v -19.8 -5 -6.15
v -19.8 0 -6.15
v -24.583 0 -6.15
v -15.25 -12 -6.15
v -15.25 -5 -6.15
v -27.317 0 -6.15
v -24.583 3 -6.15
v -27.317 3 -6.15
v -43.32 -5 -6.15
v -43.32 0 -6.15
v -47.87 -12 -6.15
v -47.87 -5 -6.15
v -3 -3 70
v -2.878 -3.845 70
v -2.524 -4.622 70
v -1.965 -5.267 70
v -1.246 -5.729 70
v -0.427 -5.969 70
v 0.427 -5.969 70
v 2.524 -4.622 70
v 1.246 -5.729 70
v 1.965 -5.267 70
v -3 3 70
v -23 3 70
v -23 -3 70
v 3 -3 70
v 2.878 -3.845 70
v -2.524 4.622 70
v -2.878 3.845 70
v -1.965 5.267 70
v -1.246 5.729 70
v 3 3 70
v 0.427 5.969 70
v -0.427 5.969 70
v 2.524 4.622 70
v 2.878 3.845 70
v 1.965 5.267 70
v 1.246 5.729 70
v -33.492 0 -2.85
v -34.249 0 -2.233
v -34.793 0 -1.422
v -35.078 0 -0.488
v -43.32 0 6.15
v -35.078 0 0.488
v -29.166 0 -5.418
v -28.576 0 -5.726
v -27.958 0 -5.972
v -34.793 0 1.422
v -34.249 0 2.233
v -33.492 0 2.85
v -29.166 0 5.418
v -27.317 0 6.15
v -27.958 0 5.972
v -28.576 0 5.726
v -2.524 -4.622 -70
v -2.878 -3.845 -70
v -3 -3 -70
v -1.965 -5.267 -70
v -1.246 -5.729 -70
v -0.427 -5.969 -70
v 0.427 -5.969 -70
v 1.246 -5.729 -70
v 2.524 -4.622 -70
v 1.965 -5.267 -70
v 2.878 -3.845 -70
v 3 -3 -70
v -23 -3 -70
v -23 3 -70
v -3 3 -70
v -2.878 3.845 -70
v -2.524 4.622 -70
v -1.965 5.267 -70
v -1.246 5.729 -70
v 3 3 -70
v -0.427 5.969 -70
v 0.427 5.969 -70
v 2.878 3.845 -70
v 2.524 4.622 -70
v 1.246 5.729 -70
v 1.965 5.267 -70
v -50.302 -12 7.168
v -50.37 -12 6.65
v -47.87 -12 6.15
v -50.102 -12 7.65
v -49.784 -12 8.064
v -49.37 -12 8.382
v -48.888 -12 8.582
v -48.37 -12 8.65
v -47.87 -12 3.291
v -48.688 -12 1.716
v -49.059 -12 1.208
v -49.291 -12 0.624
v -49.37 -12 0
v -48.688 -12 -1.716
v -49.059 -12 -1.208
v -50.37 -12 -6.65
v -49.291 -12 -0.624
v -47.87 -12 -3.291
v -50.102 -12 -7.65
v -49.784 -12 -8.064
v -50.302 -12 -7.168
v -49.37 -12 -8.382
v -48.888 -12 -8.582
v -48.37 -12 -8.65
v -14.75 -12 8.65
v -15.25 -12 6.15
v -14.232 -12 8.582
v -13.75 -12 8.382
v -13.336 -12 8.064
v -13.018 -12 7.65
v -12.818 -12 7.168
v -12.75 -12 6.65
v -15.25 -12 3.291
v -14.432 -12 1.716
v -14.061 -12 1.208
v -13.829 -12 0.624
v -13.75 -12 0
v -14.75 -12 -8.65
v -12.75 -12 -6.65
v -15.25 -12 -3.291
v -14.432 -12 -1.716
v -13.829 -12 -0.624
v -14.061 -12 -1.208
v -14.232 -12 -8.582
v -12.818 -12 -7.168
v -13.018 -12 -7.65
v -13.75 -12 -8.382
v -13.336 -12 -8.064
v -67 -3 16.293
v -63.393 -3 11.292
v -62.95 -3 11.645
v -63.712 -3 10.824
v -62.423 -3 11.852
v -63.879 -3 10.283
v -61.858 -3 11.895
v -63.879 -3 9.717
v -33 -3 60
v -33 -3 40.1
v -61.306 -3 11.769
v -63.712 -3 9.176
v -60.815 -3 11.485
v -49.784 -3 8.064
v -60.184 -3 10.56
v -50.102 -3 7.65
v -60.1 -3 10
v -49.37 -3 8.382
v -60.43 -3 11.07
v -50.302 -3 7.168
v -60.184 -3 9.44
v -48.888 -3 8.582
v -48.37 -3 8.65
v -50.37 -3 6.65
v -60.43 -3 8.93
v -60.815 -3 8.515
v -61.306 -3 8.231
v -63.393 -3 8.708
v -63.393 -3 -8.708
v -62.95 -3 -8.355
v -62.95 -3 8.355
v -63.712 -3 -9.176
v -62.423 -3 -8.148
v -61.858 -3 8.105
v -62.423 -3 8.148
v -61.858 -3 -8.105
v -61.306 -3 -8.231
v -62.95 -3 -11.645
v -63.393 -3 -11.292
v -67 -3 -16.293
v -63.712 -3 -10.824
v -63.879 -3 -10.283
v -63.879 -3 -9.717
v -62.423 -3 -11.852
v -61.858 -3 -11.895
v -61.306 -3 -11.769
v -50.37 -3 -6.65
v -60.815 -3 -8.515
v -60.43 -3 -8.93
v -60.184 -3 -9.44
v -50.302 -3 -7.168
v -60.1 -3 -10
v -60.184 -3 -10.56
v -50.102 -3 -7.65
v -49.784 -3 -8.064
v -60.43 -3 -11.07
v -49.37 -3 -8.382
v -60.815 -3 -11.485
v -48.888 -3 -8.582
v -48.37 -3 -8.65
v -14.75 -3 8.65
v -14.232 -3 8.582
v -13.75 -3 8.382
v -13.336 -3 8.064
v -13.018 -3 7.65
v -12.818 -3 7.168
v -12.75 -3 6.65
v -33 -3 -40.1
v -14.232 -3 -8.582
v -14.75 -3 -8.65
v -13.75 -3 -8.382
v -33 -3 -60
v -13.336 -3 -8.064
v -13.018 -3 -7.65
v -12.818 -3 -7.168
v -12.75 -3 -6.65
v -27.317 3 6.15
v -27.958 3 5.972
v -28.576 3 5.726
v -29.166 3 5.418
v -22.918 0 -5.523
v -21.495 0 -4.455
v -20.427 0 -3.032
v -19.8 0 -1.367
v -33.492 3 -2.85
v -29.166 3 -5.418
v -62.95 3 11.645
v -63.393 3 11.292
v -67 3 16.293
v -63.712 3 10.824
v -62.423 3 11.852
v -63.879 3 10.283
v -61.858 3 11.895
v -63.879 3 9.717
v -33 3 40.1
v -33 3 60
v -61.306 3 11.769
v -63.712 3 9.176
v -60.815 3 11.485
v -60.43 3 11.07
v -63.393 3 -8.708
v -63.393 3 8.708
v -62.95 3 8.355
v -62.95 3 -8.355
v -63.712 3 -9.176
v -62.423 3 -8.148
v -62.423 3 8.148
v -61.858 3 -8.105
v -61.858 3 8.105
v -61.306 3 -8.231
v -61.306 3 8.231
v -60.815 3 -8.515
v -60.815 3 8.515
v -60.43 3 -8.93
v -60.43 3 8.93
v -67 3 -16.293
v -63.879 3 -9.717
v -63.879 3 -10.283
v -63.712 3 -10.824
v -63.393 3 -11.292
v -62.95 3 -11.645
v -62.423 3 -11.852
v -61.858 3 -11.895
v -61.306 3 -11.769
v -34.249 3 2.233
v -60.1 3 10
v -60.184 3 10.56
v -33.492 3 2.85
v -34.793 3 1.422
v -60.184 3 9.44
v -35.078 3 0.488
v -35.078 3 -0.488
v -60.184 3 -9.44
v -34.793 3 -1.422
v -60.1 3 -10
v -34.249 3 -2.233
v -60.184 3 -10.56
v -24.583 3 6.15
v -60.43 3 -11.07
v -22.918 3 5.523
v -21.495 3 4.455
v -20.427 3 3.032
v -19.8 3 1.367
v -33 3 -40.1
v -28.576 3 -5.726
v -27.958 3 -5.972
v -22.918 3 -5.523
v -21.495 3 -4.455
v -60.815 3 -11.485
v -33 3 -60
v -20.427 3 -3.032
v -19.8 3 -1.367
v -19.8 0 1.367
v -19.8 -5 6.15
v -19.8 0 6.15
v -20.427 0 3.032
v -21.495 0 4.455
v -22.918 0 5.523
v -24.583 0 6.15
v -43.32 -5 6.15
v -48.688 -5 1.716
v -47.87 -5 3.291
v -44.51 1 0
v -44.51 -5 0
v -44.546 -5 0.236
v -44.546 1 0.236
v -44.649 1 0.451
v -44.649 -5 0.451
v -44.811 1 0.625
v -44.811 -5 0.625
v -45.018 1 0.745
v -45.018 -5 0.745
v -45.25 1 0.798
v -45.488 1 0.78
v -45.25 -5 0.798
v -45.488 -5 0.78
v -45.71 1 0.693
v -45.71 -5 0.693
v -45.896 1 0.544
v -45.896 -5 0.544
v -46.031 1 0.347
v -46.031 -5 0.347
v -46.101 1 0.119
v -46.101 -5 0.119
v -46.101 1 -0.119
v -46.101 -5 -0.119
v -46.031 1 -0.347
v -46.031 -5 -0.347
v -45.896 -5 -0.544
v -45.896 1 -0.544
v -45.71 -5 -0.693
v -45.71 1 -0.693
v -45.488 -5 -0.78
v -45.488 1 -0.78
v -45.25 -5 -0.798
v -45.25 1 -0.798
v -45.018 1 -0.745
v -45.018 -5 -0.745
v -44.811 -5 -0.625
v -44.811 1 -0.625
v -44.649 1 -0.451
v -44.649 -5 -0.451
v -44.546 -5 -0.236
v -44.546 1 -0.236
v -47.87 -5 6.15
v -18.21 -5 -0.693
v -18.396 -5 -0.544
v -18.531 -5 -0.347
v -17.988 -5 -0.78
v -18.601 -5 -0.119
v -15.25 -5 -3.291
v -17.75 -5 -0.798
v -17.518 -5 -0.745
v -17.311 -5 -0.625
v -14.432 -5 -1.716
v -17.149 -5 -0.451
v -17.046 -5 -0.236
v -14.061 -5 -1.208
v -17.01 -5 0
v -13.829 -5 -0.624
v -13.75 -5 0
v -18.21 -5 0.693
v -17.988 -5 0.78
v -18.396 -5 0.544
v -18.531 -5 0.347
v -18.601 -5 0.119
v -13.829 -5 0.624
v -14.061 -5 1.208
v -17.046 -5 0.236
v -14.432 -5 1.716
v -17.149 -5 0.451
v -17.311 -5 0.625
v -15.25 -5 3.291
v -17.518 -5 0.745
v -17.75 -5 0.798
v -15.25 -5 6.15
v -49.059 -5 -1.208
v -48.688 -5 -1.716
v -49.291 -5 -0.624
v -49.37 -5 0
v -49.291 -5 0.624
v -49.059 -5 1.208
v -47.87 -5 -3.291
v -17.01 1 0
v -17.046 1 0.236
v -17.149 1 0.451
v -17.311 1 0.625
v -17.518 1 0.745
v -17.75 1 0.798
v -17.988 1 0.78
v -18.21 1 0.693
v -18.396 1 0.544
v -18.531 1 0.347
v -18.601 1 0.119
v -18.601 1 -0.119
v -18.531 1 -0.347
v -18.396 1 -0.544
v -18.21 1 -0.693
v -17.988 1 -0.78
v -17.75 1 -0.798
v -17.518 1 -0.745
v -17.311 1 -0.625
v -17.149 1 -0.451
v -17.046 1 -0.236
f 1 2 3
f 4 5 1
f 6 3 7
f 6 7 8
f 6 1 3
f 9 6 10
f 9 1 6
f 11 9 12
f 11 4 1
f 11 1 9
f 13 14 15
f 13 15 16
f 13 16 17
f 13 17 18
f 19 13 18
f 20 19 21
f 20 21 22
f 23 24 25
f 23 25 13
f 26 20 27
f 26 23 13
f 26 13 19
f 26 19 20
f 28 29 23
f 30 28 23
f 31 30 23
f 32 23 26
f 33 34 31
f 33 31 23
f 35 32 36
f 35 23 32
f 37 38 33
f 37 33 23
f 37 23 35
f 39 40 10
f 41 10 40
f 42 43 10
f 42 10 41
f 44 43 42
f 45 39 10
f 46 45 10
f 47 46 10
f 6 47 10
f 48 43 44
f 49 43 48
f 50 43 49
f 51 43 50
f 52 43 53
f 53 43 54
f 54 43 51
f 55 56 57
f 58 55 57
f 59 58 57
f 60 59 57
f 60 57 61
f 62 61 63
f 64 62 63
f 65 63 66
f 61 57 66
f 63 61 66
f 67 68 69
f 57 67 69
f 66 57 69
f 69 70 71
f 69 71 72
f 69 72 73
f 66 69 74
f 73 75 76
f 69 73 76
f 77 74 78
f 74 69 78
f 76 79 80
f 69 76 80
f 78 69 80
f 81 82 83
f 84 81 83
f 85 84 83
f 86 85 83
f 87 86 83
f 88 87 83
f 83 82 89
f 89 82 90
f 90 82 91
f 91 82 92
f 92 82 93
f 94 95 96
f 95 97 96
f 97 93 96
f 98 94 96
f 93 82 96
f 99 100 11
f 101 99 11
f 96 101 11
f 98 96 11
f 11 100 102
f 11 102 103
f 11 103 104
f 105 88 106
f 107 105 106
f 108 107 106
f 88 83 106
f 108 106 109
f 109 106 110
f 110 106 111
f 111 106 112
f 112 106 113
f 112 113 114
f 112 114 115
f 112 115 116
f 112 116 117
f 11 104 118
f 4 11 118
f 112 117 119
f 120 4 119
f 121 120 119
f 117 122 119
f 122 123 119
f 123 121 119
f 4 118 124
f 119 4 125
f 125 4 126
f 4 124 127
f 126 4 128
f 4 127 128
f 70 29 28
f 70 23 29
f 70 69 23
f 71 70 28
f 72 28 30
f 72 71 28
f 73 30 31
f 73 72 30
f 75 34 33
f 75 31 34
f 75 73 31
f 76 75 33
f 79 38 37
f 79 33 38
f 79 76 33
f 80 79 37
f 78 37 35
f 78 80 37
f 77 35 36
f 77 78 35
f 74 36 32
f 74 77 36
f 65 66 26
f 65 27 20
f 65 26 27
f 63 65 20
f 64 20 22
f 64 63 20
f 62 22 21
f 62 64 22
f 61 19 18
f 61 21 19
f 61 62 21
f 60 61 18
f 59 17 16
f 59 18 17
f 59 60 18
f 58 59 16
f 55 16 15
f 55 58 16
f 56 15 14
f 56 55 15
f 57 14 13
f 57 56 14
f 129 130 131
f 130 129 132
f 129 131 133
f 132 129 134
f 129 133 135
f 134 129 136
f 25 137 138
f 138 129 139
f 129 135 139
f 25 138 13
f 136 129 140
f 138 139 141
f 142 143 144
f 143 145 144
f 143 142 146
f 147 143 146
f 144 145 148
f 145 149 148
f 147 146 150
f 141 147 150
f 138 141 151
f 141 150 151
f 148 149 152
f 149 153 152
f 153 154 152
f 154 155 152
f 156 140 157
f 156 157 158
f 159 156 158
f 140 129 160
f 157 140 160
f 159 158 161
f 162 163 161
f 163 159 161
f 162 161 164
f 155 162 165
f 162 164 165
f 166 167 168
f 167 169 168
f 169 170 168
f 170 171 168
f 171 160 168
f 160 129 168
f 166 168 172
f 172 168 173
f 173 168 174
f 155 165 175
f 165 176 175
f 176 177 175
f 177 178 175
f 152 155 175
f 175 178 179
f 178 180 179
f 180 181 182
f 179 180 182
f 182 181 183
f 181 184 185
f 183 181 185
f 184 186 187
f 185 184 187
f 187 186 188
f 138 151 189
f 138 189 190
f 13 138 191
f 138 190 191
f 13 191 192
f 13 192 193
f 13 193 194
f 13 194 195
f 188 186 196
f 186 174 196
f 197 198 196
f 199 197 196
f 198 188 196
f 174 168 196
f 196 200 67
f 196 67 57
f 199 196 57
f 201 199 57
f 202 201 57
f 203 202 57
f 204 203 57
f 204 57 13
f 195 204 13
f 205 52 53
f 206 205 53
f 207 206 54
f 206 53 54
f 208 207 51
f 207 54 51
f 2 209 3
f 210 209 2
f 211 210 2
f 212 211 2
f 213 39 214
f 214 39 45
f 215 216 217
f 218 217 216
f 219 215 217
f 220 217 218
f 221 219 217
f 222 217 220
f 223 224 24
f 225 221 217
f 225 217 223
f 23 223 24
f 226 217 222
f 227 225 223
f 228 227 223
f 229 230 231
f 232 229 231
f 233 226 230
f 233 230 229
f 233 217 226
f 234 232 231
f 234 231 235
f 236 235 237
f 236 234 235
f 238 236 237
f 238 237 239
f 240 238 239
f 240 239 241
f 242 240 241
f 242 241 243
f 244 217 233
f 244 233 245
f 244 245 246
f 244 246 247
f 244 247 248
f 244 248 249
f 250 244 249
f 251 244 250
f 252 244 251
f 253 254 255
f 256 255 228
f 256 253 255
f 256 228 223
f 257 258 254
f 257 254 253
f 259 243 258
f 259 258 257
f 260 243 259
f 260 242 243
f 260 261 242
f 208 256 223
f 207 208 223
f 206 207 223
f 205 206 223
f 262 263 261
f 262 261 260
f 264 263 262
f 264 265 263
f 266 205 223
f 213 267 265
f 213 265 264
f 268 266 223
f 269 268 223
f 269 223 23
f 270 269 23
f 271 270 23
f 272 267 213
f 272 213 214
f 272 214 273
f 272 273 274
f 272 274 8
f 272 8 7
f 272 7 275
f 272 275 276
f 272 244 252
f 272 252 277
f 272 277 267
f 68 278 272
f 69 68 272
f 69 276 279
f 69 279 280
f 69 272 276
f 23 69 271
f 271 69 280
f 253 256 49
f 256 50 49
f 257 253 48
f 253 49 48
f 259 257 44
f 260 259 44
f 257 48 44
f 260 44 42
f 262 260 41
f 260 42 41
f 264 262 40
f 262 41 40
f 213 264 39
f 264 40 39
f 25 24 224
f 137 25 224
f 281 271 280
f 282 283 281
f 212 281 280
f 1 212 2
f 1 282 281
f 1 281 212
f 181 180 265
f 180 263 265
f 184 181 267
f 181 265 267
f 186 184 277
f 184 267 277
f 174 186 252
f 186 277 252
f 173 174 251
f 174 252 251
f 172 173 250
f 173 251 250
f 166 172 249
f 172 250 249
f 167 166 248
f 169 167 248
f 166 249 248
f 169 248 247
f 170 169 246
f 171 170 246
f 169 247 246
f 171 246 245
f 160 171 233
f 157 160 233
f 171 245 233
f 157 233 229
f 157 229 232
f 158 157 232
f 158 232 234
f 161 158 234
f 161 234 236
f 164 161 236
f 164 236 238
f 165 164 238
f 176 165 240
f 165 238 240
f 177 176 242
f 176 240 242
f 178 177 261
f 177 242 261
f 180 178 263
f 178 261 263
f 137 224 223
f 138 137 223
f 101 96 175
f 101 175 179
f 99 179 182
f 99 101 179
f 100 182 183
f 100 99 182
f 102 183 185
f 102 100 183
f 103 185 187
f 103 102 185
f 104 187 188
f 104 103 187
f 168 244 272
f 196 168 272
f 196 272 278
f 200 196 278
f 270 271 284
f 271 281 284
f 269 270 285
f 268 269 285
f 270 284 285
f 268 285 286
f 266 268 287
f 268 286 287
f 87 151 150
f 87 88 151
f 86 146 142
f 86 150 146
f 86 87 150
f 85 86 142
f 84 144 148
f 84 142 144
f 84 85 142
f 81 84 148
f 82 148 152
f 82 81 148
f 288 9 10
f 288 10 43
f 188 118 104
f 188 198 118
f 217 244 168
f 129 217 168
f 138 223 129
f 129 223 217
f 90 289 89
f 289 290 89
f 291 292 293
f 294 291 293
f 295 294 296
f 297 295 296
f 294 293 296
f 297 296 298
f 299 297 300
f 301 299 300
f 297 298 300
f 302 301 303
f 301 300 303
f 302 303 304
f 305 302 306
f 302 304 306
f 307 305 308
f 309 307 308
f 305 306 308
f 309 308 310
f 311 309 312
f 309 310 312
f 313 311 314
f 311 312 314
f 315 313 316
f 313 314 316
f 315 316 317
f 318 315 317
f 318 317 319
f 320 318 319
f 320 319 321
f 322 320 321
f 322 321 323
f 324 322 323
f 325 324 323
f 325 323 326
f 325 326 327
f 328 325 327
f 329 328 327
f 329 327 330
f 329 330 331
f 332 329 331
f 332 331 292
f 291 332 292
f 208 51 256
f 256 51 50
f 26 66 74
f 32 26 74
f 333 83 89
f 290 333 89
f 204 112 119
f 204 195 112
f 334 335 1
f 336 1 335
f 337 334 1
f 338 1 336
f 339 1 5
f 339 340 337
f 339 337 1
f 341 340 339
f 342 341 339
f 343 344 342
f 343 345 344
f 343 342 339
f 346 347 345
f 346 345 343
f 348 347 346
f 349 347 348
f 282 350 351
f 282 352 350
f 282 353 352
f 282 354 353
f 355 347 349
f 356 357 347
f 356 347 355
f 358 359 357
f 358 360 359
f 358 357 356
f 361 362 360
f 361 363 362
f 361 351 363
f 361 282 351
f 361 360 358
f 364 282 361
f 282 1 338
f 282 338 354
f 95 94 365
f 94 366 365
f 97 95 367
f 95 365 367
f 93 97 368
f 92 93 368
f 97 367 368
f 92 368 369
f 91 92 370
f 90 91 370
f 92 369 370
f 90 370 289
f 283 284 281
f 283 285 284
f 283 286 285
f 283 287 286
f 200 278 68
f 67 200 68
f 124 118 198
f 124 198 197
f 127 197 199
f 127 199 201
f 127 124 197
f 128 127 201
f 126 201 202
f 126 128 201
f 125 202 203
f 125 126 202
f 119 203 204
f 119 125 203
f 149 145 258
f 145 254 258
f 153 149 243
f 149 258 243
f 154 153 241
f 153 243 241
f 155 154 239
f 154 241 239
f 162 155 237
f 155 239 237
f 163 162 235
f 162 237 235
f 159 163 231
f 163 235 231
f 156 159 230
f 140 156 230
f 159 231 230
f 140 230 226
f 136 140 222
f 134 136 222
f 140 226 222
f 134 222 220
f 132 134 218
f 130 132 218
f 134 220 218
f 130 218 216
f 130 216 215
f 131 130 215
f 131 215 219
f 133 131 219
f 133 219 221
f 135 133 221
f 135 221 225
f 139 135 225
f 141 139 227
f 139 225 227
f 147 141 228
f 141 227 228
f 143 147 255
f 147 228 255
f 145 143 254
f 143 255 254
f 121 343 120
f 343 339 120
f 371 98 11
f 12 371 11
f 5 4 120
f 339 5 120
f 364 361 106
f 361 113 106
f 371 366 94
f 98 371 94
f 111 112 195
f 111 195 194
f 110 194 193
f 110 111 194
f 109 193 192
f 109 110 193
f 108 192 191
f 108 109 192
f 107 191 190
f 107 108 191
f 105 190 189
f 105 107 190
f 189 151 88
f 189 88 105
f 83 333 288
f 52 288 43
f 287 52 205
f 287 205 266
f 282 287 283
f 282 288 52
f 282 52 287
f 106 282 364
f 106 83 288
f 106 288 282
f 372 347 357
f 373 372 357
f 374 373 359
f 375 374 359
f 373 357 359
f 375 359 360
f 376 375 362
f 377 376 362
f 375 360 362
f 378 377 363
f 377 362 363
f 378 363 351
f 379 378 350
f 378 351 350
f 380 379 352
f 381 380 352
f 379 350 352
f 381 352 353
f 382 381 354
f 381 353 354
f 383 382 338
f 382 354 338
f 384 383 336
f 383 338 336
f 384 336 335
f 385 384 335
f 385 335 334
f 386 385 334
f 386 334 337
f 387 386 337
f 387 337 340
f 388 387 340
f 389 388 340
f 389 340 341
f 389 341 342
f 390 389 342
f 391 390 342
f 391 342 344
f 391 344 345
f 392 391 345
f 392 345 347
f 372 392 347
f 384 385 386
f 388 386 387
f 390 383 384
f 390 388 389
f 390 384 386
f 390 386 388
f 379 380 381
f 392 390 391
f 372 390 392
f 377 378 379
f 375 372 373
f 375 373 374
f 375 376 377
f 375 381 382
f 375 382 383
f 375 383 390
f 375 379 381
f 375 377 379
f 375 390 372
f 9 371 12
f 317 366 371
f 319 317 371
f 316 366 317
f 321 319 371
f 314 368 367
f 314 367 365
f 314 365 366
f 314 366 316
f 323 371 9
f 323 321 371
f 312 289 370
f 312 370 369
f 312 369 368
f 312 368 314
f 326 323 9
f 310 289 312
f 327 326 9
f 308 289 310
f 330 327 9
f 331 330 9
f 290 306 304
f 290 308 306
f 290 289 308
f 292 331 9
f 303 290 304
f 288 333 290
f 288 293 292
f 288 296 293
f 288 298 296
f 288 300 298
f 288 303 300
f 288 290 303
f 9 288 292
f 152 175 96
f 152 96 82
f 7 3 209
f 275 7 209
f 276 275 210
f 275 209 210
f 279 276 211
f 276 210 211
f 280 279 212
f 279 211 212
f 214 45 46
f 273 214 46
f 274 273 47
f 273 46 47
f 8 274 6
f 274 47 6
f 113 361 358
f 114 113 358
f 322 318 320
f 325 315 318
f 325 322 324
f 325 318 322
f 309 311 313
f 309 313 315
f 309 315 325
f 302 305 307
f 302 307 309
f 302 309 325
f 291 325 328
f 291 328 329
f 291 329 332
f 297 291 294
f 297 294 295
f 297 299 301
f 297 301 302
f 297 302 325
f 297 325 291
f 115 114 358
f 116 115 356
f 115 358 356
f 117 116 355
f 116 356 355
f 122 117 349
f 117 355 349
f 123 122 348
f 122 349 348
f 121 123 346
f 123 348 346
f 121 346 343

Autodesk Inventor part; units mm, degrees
ref_plane "YZ Plane" through (0, 0, 0) normal (1, 0, 0) x (0, 1, 0)
ref_plane "XY Plane" through (0, 0, 0) normal (0, 0, 1) x (1, 0, 0)
sketch "Sketch1" plane through (0, 0, 0) normal (0, 0, 1) x (1, 0, 0)
  line L0 (-67, 3) -> (-67, -3)
  line L1 (-67, -3) -> (-3, -3)
  line L2 (-67, 3) -> (-3, 3)
  line L3 (0, -3) -> (0, 3) construction
  line L4 (3, -3) -> (3, 3)
  line L5 (-3, 3) -> (-3, -3)
  arc A0 (-3, -3) -> (3, -3) centre (0, -3) ccw
  arc A1 (3, 3) -> (-3, 3) centre (0, 3) ccw
  point P0 (0, 0)
  point P1 (-3, -3)
  dimension "d0" = 70
  dimension "d1" = 3
  dimension "d2" = 6
  dimension "d3" = 6
extrude "Extrusion1" add sketch "Sketch1" along normal mid plane 140
sketch "Sketch2" plane through (-67, 3, 70) normal (0, 1, 0) x (1, 0, 0)
  line L0 (0, 0) -> (64, 0) projected
  line L1 (64, 0) -> (44, 0)
  line L2 (0, 140) -> (0, 0) projected
  line L3 (44, 0) -> (34, 10)
  line L4 (34, 10) -> (34, 29.9)
  line L5 (34, 29.9) -> (0, 53.7071)
  line L6 (0, 53.7071) -> (0, 86.2929)
  line L7 (0, 86.2929) -> (34, 110.1)
  line L8 (34, 110.1) -> (34, 130)
  line L9 (34, 130) -> (44, 140)
  line L10 (0, 140) -> (64, 140) projected
  line L11 (44, 140) -> (64, 140)
  line L12 (64, 140) -> (64, 0) projected
  point P0 (67, 70)
  dimension "d6" = 20
  dimension "d7" = 20
  dimension "d8" = 30
  dimension "d9" = 45
  dimension "d10" = 45
  dimension "d11" = 19.9
  dimension "d12" = 19.9
  dimension "d13" = 125
  dimension "d14" = 125
extrude "Extrusion2" cut sketch "Sketch2" against normal through all contours L2 L5 L4 L3 L0 | L2 L10 L9 L8 L7
sketch "Sketch3" plane through (-3, 3, 70) normal (0, 1, 0) x (1, 0, 0)
  circle A0 centre (-59, 80) radius 1.9
  circle A1 centre (-59, 60) radius 1.9
  line L0 (-64, 86.2929) -> (-64, 53.7071) projected
  line L1 (-59, 80) -> (-59, 60)
  point P0 (3, 70)
  point P1 (-64, 70)
  dimension "d17" = 3.8
  dimension "d18" = 3.8
  dimension "d19" = 20
  dimension "d20" = 10
  dimension "d21" = 5
extrude "Extrusion3" cut sketch "Sketch3" against normal through all
sketch "Sketch4" plane through (-3, 3, 70) normal (0, 1, 0) x (1, 0, 0)
  line L0 (-44.67, 64.05) -> (-12.45, 64.05)
  line L1 (-12.45, 64.05) -> (-12.45, 75.95)
  line L2 (-12.45, 75.95) -> (-44.67, 75.95)
  line L3 (-44.67, 75.95) -> (-44.67, 64.05)
  line L4 (-44.67, 64.05) -> (-12.45, 75.95) construction
  line L5 (-12.45, 64.05) -> (-44.67, 75.95) construction
  line L6 (6, 140) -> (6, 0) projected
  line L7 (6, 70) -> (-4, 70)
  line L8 (-40.17, 64.05) -> (-16.95, 64.05)
  line L9 (-16.95, 64.05) -> (-16.95, 75.95)
  line L10 (-16.95, 75.95) -> (-40.17, 75.95)
  line L11 (-40.17, 75.95) -> (-40.17, 64.05)
  line L12 (0, 140) -> (0, 0) projected
  line L13 (-44.87, 76.15) -> (-12.25, 76.15)
  line L14 (-12.25, 76.15) -> (-12.25, 63.85)
  line L15 (-12.25, 63.85) -> (-44.87, 63.85)
  line L16 (-44.87, 63.85) -> (-44.87, 76.15)
  line L17 (-47.37, 78.65) -> (-47.37, 61.35)
  line L18 (-9.75, 61.35) -> (-9.75, 78.65)
  circle A0 centre (-59, 80) radius 1.9 projected
  circle A1 centre (-59, 60) radius 1.9 projected
  line L19 (-47.37, 61.35) -> (-60.337, 61.35)
  line L20 (-57.663, 61.35) -> (-9.75, 61.35)
  line L21 (-9.75, 78.65) -> (-57.663, 78.65)
  line L22 (-60.337, 78.65) -> (-47.37, 78.65)
  circle A2 centre (-29, 70) radius 2.45
  point P0 (3, 70)
  point P1 (-28.56, 70)
  point P2 (-47.37, 78.65)
  point P3 (-47.37, 61.35)
  point P4 (-57.663, 61.35)
  point P5 (-57.663, 78.65)
  dimension "d24" = 32.22
  dimension "d25" = 11.9
  dimension "d26" = 4.5
  dimension "d27" = 4.5
  dimension "d30" = 0.2
  dimension "d34" = 2.5
  dimension "d35" = 2.5
  dimension "d36" = 2.5
  dimension "d37" = 2.5
  dimension "d51" = 29
  dimension "d52" = 12.05
  dimension "d53" = 4.9
extrude "Extrusion4" add sketch "Sketch4" against normal blind 15 contours L3 L2 L11 L0 | L11 L2 L9 L0 | L9 L2 L1 L0 | L13 L14 L15 L16 | L21 L18 L20 L17 | A2
sketch "Sketch5" plane through (-3, -12, 70) normal (0, -1, 0) x (1, 0, 0)
  circle A0 centre (-59, -80) radius 1.9 projected
  circle A1 centre (-59, -60) radius 1.9 projected
  line L0 (-30, -110.1) -> (-64, -86.2929) projected
  line L1 (-64, -86.2929) -> (-64, -53.7071) projected
  line L2 (-64, -53.7071) -> (-30, -29.9) projected
  line L3 (-30, -29.9) -> (-30, -10) projected
  line L4 (-30, -10) -> (-20, 0) projected
  line L5 (0, 0) -> (-20, 0) projected
  line L6 (0, -140) -> (0, 0) projected
  line L7 (-20, -140) -> (0, -140) projected
  line L8 (-20, -140) -> (-30, -130) projected
  line L9 (-30, -130) -> (-30, -110.1) projected
  line L10 (-12.45, -75.95) -> (-44.67, -75.95) projected
  line L11 (-16.95, -64.05) -> (-16.95, -75.95) projected
  line L12 (-44.87, -76.15) -> (-12.25, -76.15) projected
  line L13 (-12.25, -76.15) -> (-12.25, -63.85) projected
  line L14 (-12.45, -64.05) -> (-12.45, -75.95) projected
  line L15 (-44.67, -64.05) -> (-12.45, -64.05) projected
  line L16 (-12.25, -63.85) -> (-44.87, -63.85) projected
  line L17 (-44.87, -63.85) -> (-44.87, -76.15) projected
  line L18 (-44.67, -75.95) -> (-44.67, -64.05) projected
  line L19 (-44.67, -64.05) -> (-12.45, -75.95) construction
  line L20 (-40.17, -75.95) -> (-40.17, -64.05) projected
  line L21 (-40.17, -75.95) -> (-40.17, -76.15)
  line L22 (-40.17, -64.05) -> (-40.17, -63.85)
  line L23 (-16.95, -76.15) -> (-16.95, -75.95)
  line L24 (-16.95, -64.05) -> (-16.95, -63.85)
  point P0 (3, -70)
extrude "Extrusion5" cut sketch "Sketch5" against normal blind 7 contours L14 L15 L24 L16 L13 L12 L23 L10 | L10 L11 L15 L14 | L23 L12 L21 L10 | L10 L20 L15 L11 | L21 L12 L17 L16 L22 L15 L18 L10 | L10 L18 L15 L20 | L15 L22 L16 L24
sketch "Sketch6" plane through (-3, -5, 70) normal (0, -1, 0) x (1, 0, 0)
  line L0 (-16.95, -64.05) -> (-16.95, -75.95) construction
  line L1 (-12.45, -64.05) -> (-44.67, -75.95) construction
  line L2 (-40.17, -75.95) -> (-40.17, -64.05) construction
  line L3 (-12.25, -63.85) -> (-12.25, -76.15) projected
  line L4 (-44.87, -63.85) -> (-12.25, -63.85) projected
  line L5 (-44.87, -76.15) -> (-44.87, -63.85) projected
  line L6 (-12.25, -76.15) -> (-44.87, -76.15) projected
  line L7 (-16.95, -64.05) -> (-16.95, -63.85)
  line L8 (-44.87, -63.85) -> (-12.25, -63.85) projected
  line L9 (-16.95, -75.95) -> (-16.95, -76.15)
  line L10 (-40.17, -76.15) -> (-40.17, -75.95)
  line L11 (-40.17, -64.05) -> (-40.17, -63.85)
  line L12 (-40.32, -76.15) -> (-40.32, -63.85)
  line L13 (-16.8, -76.15) -> (-16.8, -63.85)
  line L14 (-40.32, -76.15) -> (-16.8, -76.15)
  line L15 (-16.8, -76.15) -> (-16.8, -63.85)
  line L16 (-16.8, -63.85) -> (-40.32, -63.85)
  line L17 (-40.32, -63.85) -> (-40.32, -76.15)
  point P0 (3, -70)
  dimension "d40" = 0.15
  dimension "d41" = 0.15
extrude "Extrusion6" cut sketch "Sketch6" against normal blind 5 contours L13 L6 L12 L4
sketch "Sketch7" plane through (-3, 0, 70) normal (0, -1, 0) x (1, 0, 0)
  line L0 (-16.8, -63.85) -> (-16.8, -76.15) projected
  line L1 (-16.8, -70) -> (-21, -70)
  circle A0 centre (-22.95, -70) radius 6.15 construction
  line L2 (-44.87, -63.85) -> (-12.25, -63.85) projected
  arc A1 (-24.3166, -63.85) -> (-24.3166, -76.15) centre (-22.95, -70) ccw
  circle A2 centre (-28.8, -70) radius 3 construction
  line L3 (-24.3166, -63.85) -> (-30.3313, -67.4202) construction
  line L4 (-30.3313, -72.5798) -> (-24.3166, -76.15) construction
  line L5 (-12.25, -76.15) -> (-44.87, -76.15) projected
  arc A3 (-21.5834, -63.85) -> (-24.3166, -63.85) centre (-22.95, -70) ccw construction
  arc A4 (-21.5834, -76.15) -> (-16.8, -71.3666) centre (-22.95, -70) ccw
  arc A5 (-24.3166, -76.15) -> (-21.5834, -76.15) centre (-22.95, -70) ccw construction
  arc A6 (-16.8, -71.3666) -> (-16.8, -68.6334) centre (-22.95, -70) ccw construction
  arc A7 (-16.8, -68.6334) -> (-21.5834, -63.85) centre (-22.95, -70) ccw
  line L6 (-26.1657, -64.5825) -> (-30.4916, -67.1503)
  arc A8 (-28.169, -66.7467) -> (-28.3286, -66.7197) centre (-28.8, -70) ccw
  arc A9 (-30.4916, -67.1503) -> (-30.4916, -72.8497) centre (-28.8, -70) ccw
  line L7 (-30.4916, -72.8497) -> (-26.1657, -75.4175)
  point P0 (3, -70)
  dimension "d44" = 0.15
  dimension "d45" = 6
  dimension "d46" = 12
extrude "Extrusion7" cut sketch "Sketch7" against normal through all contours L0 A4 L5 A1 L2 A7 | A1 L7 A9 L6
fillet "Fillet1" radius 2 4 edges at (-12.75, -7.5, -8.65) (-50.37, -7.5, -8.65) (-50.37, -7.5, 8.65) (-12.75, -7.5, 8.65)
sketch "Sketch9" plane through (-3, -5, 70) normal (0, -1, 0) x (1, 0, 0)
  circle A0 centre (-14.81, -70) radius 0.8
  line L0 (3, -70) -> (-41.3866, -70) construction
  line L1 (-40.32, -76.15) -> (-40.32, -63.85) projected
  line L2 (6, -140) -> (6, 0) projected
  circle A1 centre (-42.31, -70) radius 0.8
  dimension "d64" = 1.6
  dimension "d65" = 20.81
  dimension "d66" = 1.6
  dimension "d67" = 27.5
extrude "Extrusion9" cut sketch "Sketch9" against normal blind 6
sketch "Sketch10" plane through (-3, -5, 70) normal (0, -1, 0) x (1, 0, 0)
  circle A0 centre (-14.81, -70) radius 0.8 projected
  circle A1 centre (-42.31, -70) radius 0.8 projected
  line L0 (-12.4678, -70) -> (-46, -70)
  line L1 (-44.87, -63.85) -> (-12.25, -63.85) projected
  line L2 (-12.25, -63.85) -> (-12.25, -76.15) projected
  line L3 (-12.25, -76.15) -> (-44.87, -76.15) projected
  line L4 (-44.87, -76.15) -> (-44.87, -63.85) projected
  arc A2 (-9.75, -63.35) -> (-11.75, -61.35) centre (-11.75, -63.35) ccw projected
  line L5 (-11.75, -61.35) -> (-45.37, -61.35) projected
  arc A3 (-45.37, -61.35) -> (-47.37, -63.35) centre (-45.37, -63.35) ccw projected
  line L6 (-47.37, -63.35) -> (-47.37, -76.65) projected
  arc A4 (-47.37, -76.65) -> (-45.37, -78.65) centre (-45.37, -76.65) ccw projected
  line L7 (-45.37, -78.65) -> (-11.75, -78.65) projected
  arc A5 (-11.75, -78.65) -> (-9.75, -76.65) centre (-11.75, -76.65) ccw projected
  line L8 (-9.75, -76.65) -> (-9.75, -63.35) projected
  line L9 (-10.75, -63.35) -> (-10.75, -76.65)
  line L10 (-46.37, -64) -> (-46.37, -74.4084)
  circle A6 centre (-43.87, -70) radius 2.5
  circle A7 centre (-13.25, -70) radius 2.5
  point P0 (3, -70)
  point P1 (-44.87, -67.7087)
  point P2 (-44.87, -72.2913)
  point P3 (-12.25, -67.7087)
  point P4 (-12.25, -72.2913)
  dimension "d70" = 1
  dimension "d71" = 1
  dimension "d72" = 5
  dimension "d73" = 5
extrude "Extrusion10" cut sketch "Sketch10" along normal through all contours A7 L2 | L4 A6 picked at (-11.5834, -70.097)
chamfer "Chamfer1" distance 1 angle 45 4 edges at (-15.25, -8.5, 2.2913) (-15.25, -8.5, -2.2913) (-47.87, -8.5, -2.2913) (-47.87, -8.5, 2.2913)
equation "\"d7\" = d6"
equation "\"d10\" = d9"
equation "\"d12\" = d11"
equation "\"d14\" = d13"
equation "\"d17\" = d18"
equation "\"d27\" = d26"
equation "\"d34\" = d36"
equation "\"d35\" = d36"
equation "\"d37\" = d36"
properties part number "gripper_head 1"
